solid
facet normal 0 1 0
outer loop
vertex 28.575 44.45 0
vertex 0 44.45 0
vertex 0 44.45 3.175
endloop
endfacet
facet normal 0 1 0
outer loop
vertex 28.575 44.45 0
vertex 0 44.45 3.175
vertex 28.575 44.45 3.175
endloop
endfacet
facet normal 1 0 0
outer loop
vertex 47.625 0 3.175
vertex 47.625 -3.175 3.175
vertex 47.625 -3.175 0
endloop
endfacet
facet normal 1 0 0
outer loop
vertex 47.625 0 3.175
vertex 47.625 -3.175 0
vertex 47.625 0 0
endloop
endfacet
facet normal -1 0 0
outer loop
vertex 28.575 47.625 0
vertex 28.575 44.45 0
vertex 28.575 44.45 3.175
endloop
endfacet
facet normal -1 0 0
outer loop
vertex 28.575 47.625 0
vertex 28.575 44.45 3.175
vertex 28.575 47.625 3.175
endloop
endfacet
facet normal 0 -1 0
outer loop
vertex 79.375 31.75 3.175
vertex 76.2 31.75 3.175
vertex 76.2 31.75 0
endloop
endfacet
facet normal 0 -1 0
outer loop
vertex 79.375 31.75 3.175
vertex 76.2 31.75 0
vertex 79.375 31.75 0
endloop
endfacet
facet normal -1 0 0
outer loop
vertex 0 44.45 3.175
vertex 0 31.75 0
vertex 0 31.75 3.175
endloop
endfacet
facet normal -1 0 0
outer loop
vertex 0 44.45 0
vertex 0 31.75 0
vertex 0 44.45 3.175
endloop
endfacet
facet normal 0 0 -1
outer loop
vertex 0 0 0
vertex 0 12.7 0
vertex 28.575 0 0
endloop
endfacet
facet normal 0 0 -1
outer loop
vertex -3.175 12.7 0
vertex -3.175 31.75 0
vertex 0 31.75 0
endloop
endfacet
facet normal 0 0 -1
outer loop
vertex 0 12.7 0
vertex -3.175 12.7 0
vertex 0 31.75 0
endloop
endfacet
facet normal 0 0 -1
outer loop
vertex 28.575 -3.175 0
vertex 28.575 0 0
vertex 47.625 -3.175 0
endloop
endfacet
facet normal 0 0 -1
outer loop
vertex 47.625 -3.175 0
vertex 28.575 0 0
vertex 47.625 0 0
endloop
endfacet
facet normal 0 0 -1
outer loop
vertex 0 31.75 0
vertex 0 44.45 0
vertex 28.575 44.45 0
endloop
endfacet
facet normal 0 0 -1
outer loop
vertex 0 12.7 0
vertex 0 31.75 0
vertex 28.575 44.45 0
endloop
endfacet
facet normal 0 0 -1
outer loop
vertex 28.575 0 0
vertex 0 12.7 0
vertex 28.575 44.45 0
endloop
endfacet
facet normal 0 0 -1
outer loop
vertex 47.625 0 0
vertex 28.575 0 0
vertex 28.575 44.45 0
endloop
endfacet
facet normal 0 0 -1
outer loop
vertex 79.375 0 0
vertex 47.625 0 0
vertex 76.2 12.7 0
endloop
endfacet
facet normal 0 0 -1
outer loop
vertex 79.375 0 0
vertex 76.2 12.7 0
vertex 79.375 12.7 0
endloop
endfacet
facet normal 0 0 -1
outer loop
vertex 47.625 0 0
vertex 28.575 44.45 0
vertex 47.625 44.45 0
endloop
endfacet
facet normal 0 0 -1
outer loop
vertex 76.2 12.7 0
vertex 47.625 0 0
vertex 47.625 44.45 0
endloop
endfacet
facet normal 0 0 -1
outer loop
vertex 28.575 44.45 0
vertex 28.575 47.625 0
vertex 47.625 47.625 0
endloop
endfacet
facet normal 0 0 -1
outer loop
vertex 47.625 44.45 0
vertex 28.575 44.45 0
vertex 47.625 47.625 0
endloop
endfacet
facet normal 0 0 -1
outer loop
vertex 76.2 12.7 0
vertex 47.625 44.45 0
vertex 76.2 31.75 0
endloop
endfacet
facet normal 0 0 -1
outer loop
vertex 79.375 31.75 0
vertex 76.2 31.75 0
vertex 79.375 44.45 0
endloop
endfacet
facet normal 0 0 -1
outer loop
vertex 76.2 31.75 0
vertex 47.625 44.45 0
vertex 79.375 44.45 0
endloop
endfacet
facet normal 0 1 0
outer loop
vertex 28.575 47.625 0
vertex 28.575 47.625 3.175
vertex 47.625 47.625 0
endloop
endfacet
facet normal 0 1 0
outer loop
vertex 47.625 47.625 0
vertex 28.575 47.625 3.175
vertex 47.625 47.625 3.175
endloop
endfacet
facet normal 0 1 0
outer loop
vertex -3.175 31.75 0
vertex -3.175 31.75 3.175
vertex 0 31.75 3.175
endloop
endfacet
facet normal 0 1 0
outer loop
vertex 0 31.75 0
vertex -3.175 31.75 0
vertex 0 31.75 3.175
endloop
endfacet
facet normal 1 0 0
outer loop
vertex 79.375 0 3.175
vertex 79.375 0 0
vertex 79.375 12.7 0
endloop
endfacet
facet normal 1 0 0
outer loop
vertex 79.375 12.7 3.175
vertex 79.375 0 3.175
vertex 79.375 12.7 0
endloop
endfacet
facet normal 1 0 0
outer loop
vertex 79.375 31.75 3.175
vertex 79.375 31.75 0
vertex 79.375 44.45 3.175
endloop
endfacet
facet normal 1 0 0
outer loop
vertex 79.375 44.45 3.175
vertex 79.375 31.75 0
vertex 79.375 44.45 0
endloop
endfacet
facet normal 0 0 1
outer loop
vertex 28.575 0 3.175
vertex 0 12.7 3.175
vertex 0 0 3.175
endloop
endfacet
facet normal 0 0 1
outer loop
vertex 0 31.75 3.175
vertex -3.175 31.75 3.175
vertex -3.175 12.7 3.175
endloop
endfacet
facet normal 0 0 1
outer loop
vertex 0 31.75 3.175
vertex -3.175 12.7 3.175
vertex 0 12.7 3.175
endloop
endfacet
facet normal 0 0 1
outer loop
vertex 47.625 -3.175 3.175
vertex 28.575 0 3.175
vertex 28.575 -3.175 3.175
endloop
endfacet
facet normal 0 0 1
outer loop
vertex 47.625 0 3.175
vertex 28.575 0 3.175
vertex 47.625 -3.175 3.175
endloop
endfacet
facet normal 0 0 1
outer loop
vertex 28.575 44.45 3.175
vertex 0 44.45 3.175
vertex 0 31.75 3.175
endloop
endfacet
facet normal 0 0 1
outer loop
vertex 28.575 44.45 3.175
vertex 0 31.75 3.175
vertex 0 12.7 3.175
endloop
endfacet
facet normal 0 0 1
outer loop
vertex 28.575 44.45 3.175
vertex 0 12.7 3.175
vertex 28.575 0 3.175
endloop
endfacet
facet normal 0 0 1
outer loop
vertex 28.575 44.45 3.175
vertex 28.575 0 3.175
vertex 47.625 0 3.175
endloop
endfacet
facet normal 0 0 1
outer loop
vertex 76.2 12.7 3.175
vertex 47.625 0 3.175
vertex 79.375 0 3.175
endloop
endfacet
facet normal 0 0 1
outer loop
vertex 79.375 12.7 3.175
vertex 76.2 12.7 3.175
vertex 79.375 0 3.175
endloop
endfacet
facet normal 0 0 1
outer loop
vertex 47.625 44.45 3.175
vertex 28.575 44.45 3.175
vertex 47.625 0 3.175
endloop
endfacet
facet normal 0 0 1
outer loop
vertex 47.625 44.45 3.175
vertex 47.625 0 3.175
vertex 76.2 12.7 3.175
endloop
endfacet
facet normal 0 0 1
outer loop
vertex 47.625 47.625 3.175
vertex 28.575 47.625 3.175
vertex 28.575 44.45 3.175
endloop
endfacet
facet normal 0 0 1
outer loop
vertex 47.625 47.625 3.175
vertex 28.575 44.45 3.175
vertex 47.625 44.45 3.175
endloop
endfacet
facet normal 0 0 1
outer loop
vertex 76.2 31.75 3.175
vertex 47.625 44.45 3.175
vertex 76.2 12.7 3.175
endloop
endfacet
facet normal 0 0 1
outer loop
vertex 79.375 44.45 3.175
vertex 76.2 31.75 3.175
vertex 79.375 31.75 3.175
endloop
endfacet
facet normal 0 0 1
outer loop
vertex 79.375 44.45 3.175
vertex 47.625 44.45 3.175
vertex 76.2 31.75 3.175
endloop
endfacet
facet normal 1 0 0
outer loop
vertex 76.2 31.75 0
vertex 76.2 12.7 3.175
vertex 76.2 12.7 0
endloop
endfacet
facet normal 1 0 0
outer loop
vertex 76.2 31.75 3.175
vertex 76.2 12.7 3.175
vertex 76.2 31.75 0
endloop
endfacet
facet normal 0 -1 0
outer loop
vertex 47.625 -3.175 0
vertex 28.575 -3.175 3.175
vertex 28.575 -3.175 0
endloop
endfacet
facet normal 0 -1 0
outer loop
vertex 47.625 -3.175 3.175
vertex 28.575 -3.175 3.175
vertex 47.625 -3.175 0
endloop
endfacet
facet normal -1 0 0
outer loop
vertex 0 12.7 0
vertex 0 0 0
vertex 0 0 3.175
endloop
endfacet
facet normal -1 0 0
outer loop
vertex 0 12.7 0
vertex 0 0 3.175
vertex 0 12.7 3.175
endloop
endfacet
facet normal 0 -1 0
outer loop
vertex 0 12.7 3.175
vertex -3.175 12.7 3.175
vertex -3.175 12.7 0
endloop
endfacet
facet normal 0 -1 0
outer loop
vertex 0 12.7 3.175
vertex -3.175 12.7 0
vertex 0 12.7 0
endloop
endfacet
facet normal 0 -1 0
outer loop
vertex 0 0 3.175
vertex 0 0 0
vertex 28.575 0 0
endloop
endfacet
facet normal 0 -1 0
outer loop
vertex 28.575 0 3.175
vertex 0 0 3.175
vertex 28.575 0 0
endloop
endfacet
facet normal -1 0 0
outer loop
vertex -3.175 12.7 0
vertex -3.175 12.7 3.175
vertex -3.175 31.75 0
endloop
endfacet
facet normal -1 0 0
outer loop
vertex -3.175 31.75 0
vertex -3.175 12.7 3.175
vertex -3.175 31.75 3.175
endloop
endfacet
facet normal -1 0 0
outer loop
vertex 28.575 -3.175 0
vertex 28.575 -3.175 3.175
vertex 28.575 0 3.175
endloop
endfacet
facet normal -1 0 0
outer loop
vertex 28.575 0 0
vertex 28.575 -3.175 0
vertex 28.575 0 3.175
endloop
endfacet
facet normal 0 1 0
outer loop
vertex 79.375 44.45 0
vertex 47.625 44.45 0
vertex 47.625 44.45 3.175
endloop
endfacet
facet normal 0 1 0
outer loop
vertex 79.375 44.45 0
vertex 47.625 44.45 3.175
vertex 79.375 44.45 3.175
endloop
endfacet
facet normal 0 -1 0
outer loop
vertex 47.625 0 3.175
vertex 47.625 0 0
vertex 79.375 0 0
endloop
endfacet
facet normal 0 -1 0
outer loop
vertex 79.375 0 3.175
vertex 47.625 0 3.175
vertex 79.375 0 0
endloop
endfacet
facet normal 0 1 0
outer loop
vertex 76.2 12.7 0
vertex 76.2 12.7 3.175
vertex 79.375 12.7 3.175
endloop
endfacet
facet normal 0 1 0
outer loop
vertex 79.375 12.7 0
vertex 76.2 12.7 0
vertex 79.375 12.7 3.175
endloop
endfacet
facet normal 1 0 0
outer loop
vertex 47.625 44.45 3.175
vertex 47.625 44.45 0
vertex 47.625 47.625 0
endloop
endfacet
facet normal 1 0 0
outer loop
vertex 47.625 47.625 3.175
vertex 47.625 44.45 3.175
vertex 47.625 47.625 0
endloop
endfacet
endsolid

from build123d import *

# Parameters (mm, degrees)
SKETCH1_W           = 79.375
SKETCH1_H           = 44.45
BOSS_EXTRUDE1_DEPTH = 3.175
SKETCH2_W           = 3.175
SKETCH2_H           = 19.05
BOSS_EXTRUDE2_DEPTH = 3.175
SKETCH5_W           = 19.05
SKETCH5_H           = 3.175
BOSS_EXTRUDE3_DEPTH = 3.175
SKETCH3_W           = 3.175
SKETCH3_H           = 19.05
CUT_EXTRUDE1_DEPTH  = 3.175


with BuildPart() as part:
    # Sketch1 → Boss-Extrude1 (new body)
    with BuildSketch(Plane.XY):
        with Locations((39.6875, 22.225)):
            Rectangle(SKETCH1_W, SKETCH1_H)
    extrude(amount=BOSS_EXTRUDE1_DEPTH)

    # Sketch2 → Boss-Extrude2 (add)
    with BuildSketch(Plane.XY.offset(3.175)):
        with Locations((-1.5875, 22.225)):
            Rectangle(SKETCH2_W, SKETCH2_H)
    extrude(amount=-BOSS_EXTRUDE2_DEPTH)

    # Sketch5 → Boss-Extrude3 (add)
    with BuildSketch(Plane.XY.offset(3.175)):
        with Locations((38.1, 46.0375)):
            Rectangle(SKETCH5_W, SKETCH5_H)
        with Locations((38.1, -1.5875)):
            Rectangle(SKETCH5_W, SKETCH5_H)
    extrude(amount=-BOSS_EXTRUDE3_DEPTH)

    # Sketch3 → Cut-Extrude1 (cut)
    with BuildSketch(Plane.XY.offset(3.175)):
        with Locations((77.7875, 22.225)):
            Rectangle(SKETCH3_W, SKETCH3_H)
    extrude(amount=-CUT_EXTRUDE1_DEPTH, mode=Mode.SUBTRACT)


solid = part.part
